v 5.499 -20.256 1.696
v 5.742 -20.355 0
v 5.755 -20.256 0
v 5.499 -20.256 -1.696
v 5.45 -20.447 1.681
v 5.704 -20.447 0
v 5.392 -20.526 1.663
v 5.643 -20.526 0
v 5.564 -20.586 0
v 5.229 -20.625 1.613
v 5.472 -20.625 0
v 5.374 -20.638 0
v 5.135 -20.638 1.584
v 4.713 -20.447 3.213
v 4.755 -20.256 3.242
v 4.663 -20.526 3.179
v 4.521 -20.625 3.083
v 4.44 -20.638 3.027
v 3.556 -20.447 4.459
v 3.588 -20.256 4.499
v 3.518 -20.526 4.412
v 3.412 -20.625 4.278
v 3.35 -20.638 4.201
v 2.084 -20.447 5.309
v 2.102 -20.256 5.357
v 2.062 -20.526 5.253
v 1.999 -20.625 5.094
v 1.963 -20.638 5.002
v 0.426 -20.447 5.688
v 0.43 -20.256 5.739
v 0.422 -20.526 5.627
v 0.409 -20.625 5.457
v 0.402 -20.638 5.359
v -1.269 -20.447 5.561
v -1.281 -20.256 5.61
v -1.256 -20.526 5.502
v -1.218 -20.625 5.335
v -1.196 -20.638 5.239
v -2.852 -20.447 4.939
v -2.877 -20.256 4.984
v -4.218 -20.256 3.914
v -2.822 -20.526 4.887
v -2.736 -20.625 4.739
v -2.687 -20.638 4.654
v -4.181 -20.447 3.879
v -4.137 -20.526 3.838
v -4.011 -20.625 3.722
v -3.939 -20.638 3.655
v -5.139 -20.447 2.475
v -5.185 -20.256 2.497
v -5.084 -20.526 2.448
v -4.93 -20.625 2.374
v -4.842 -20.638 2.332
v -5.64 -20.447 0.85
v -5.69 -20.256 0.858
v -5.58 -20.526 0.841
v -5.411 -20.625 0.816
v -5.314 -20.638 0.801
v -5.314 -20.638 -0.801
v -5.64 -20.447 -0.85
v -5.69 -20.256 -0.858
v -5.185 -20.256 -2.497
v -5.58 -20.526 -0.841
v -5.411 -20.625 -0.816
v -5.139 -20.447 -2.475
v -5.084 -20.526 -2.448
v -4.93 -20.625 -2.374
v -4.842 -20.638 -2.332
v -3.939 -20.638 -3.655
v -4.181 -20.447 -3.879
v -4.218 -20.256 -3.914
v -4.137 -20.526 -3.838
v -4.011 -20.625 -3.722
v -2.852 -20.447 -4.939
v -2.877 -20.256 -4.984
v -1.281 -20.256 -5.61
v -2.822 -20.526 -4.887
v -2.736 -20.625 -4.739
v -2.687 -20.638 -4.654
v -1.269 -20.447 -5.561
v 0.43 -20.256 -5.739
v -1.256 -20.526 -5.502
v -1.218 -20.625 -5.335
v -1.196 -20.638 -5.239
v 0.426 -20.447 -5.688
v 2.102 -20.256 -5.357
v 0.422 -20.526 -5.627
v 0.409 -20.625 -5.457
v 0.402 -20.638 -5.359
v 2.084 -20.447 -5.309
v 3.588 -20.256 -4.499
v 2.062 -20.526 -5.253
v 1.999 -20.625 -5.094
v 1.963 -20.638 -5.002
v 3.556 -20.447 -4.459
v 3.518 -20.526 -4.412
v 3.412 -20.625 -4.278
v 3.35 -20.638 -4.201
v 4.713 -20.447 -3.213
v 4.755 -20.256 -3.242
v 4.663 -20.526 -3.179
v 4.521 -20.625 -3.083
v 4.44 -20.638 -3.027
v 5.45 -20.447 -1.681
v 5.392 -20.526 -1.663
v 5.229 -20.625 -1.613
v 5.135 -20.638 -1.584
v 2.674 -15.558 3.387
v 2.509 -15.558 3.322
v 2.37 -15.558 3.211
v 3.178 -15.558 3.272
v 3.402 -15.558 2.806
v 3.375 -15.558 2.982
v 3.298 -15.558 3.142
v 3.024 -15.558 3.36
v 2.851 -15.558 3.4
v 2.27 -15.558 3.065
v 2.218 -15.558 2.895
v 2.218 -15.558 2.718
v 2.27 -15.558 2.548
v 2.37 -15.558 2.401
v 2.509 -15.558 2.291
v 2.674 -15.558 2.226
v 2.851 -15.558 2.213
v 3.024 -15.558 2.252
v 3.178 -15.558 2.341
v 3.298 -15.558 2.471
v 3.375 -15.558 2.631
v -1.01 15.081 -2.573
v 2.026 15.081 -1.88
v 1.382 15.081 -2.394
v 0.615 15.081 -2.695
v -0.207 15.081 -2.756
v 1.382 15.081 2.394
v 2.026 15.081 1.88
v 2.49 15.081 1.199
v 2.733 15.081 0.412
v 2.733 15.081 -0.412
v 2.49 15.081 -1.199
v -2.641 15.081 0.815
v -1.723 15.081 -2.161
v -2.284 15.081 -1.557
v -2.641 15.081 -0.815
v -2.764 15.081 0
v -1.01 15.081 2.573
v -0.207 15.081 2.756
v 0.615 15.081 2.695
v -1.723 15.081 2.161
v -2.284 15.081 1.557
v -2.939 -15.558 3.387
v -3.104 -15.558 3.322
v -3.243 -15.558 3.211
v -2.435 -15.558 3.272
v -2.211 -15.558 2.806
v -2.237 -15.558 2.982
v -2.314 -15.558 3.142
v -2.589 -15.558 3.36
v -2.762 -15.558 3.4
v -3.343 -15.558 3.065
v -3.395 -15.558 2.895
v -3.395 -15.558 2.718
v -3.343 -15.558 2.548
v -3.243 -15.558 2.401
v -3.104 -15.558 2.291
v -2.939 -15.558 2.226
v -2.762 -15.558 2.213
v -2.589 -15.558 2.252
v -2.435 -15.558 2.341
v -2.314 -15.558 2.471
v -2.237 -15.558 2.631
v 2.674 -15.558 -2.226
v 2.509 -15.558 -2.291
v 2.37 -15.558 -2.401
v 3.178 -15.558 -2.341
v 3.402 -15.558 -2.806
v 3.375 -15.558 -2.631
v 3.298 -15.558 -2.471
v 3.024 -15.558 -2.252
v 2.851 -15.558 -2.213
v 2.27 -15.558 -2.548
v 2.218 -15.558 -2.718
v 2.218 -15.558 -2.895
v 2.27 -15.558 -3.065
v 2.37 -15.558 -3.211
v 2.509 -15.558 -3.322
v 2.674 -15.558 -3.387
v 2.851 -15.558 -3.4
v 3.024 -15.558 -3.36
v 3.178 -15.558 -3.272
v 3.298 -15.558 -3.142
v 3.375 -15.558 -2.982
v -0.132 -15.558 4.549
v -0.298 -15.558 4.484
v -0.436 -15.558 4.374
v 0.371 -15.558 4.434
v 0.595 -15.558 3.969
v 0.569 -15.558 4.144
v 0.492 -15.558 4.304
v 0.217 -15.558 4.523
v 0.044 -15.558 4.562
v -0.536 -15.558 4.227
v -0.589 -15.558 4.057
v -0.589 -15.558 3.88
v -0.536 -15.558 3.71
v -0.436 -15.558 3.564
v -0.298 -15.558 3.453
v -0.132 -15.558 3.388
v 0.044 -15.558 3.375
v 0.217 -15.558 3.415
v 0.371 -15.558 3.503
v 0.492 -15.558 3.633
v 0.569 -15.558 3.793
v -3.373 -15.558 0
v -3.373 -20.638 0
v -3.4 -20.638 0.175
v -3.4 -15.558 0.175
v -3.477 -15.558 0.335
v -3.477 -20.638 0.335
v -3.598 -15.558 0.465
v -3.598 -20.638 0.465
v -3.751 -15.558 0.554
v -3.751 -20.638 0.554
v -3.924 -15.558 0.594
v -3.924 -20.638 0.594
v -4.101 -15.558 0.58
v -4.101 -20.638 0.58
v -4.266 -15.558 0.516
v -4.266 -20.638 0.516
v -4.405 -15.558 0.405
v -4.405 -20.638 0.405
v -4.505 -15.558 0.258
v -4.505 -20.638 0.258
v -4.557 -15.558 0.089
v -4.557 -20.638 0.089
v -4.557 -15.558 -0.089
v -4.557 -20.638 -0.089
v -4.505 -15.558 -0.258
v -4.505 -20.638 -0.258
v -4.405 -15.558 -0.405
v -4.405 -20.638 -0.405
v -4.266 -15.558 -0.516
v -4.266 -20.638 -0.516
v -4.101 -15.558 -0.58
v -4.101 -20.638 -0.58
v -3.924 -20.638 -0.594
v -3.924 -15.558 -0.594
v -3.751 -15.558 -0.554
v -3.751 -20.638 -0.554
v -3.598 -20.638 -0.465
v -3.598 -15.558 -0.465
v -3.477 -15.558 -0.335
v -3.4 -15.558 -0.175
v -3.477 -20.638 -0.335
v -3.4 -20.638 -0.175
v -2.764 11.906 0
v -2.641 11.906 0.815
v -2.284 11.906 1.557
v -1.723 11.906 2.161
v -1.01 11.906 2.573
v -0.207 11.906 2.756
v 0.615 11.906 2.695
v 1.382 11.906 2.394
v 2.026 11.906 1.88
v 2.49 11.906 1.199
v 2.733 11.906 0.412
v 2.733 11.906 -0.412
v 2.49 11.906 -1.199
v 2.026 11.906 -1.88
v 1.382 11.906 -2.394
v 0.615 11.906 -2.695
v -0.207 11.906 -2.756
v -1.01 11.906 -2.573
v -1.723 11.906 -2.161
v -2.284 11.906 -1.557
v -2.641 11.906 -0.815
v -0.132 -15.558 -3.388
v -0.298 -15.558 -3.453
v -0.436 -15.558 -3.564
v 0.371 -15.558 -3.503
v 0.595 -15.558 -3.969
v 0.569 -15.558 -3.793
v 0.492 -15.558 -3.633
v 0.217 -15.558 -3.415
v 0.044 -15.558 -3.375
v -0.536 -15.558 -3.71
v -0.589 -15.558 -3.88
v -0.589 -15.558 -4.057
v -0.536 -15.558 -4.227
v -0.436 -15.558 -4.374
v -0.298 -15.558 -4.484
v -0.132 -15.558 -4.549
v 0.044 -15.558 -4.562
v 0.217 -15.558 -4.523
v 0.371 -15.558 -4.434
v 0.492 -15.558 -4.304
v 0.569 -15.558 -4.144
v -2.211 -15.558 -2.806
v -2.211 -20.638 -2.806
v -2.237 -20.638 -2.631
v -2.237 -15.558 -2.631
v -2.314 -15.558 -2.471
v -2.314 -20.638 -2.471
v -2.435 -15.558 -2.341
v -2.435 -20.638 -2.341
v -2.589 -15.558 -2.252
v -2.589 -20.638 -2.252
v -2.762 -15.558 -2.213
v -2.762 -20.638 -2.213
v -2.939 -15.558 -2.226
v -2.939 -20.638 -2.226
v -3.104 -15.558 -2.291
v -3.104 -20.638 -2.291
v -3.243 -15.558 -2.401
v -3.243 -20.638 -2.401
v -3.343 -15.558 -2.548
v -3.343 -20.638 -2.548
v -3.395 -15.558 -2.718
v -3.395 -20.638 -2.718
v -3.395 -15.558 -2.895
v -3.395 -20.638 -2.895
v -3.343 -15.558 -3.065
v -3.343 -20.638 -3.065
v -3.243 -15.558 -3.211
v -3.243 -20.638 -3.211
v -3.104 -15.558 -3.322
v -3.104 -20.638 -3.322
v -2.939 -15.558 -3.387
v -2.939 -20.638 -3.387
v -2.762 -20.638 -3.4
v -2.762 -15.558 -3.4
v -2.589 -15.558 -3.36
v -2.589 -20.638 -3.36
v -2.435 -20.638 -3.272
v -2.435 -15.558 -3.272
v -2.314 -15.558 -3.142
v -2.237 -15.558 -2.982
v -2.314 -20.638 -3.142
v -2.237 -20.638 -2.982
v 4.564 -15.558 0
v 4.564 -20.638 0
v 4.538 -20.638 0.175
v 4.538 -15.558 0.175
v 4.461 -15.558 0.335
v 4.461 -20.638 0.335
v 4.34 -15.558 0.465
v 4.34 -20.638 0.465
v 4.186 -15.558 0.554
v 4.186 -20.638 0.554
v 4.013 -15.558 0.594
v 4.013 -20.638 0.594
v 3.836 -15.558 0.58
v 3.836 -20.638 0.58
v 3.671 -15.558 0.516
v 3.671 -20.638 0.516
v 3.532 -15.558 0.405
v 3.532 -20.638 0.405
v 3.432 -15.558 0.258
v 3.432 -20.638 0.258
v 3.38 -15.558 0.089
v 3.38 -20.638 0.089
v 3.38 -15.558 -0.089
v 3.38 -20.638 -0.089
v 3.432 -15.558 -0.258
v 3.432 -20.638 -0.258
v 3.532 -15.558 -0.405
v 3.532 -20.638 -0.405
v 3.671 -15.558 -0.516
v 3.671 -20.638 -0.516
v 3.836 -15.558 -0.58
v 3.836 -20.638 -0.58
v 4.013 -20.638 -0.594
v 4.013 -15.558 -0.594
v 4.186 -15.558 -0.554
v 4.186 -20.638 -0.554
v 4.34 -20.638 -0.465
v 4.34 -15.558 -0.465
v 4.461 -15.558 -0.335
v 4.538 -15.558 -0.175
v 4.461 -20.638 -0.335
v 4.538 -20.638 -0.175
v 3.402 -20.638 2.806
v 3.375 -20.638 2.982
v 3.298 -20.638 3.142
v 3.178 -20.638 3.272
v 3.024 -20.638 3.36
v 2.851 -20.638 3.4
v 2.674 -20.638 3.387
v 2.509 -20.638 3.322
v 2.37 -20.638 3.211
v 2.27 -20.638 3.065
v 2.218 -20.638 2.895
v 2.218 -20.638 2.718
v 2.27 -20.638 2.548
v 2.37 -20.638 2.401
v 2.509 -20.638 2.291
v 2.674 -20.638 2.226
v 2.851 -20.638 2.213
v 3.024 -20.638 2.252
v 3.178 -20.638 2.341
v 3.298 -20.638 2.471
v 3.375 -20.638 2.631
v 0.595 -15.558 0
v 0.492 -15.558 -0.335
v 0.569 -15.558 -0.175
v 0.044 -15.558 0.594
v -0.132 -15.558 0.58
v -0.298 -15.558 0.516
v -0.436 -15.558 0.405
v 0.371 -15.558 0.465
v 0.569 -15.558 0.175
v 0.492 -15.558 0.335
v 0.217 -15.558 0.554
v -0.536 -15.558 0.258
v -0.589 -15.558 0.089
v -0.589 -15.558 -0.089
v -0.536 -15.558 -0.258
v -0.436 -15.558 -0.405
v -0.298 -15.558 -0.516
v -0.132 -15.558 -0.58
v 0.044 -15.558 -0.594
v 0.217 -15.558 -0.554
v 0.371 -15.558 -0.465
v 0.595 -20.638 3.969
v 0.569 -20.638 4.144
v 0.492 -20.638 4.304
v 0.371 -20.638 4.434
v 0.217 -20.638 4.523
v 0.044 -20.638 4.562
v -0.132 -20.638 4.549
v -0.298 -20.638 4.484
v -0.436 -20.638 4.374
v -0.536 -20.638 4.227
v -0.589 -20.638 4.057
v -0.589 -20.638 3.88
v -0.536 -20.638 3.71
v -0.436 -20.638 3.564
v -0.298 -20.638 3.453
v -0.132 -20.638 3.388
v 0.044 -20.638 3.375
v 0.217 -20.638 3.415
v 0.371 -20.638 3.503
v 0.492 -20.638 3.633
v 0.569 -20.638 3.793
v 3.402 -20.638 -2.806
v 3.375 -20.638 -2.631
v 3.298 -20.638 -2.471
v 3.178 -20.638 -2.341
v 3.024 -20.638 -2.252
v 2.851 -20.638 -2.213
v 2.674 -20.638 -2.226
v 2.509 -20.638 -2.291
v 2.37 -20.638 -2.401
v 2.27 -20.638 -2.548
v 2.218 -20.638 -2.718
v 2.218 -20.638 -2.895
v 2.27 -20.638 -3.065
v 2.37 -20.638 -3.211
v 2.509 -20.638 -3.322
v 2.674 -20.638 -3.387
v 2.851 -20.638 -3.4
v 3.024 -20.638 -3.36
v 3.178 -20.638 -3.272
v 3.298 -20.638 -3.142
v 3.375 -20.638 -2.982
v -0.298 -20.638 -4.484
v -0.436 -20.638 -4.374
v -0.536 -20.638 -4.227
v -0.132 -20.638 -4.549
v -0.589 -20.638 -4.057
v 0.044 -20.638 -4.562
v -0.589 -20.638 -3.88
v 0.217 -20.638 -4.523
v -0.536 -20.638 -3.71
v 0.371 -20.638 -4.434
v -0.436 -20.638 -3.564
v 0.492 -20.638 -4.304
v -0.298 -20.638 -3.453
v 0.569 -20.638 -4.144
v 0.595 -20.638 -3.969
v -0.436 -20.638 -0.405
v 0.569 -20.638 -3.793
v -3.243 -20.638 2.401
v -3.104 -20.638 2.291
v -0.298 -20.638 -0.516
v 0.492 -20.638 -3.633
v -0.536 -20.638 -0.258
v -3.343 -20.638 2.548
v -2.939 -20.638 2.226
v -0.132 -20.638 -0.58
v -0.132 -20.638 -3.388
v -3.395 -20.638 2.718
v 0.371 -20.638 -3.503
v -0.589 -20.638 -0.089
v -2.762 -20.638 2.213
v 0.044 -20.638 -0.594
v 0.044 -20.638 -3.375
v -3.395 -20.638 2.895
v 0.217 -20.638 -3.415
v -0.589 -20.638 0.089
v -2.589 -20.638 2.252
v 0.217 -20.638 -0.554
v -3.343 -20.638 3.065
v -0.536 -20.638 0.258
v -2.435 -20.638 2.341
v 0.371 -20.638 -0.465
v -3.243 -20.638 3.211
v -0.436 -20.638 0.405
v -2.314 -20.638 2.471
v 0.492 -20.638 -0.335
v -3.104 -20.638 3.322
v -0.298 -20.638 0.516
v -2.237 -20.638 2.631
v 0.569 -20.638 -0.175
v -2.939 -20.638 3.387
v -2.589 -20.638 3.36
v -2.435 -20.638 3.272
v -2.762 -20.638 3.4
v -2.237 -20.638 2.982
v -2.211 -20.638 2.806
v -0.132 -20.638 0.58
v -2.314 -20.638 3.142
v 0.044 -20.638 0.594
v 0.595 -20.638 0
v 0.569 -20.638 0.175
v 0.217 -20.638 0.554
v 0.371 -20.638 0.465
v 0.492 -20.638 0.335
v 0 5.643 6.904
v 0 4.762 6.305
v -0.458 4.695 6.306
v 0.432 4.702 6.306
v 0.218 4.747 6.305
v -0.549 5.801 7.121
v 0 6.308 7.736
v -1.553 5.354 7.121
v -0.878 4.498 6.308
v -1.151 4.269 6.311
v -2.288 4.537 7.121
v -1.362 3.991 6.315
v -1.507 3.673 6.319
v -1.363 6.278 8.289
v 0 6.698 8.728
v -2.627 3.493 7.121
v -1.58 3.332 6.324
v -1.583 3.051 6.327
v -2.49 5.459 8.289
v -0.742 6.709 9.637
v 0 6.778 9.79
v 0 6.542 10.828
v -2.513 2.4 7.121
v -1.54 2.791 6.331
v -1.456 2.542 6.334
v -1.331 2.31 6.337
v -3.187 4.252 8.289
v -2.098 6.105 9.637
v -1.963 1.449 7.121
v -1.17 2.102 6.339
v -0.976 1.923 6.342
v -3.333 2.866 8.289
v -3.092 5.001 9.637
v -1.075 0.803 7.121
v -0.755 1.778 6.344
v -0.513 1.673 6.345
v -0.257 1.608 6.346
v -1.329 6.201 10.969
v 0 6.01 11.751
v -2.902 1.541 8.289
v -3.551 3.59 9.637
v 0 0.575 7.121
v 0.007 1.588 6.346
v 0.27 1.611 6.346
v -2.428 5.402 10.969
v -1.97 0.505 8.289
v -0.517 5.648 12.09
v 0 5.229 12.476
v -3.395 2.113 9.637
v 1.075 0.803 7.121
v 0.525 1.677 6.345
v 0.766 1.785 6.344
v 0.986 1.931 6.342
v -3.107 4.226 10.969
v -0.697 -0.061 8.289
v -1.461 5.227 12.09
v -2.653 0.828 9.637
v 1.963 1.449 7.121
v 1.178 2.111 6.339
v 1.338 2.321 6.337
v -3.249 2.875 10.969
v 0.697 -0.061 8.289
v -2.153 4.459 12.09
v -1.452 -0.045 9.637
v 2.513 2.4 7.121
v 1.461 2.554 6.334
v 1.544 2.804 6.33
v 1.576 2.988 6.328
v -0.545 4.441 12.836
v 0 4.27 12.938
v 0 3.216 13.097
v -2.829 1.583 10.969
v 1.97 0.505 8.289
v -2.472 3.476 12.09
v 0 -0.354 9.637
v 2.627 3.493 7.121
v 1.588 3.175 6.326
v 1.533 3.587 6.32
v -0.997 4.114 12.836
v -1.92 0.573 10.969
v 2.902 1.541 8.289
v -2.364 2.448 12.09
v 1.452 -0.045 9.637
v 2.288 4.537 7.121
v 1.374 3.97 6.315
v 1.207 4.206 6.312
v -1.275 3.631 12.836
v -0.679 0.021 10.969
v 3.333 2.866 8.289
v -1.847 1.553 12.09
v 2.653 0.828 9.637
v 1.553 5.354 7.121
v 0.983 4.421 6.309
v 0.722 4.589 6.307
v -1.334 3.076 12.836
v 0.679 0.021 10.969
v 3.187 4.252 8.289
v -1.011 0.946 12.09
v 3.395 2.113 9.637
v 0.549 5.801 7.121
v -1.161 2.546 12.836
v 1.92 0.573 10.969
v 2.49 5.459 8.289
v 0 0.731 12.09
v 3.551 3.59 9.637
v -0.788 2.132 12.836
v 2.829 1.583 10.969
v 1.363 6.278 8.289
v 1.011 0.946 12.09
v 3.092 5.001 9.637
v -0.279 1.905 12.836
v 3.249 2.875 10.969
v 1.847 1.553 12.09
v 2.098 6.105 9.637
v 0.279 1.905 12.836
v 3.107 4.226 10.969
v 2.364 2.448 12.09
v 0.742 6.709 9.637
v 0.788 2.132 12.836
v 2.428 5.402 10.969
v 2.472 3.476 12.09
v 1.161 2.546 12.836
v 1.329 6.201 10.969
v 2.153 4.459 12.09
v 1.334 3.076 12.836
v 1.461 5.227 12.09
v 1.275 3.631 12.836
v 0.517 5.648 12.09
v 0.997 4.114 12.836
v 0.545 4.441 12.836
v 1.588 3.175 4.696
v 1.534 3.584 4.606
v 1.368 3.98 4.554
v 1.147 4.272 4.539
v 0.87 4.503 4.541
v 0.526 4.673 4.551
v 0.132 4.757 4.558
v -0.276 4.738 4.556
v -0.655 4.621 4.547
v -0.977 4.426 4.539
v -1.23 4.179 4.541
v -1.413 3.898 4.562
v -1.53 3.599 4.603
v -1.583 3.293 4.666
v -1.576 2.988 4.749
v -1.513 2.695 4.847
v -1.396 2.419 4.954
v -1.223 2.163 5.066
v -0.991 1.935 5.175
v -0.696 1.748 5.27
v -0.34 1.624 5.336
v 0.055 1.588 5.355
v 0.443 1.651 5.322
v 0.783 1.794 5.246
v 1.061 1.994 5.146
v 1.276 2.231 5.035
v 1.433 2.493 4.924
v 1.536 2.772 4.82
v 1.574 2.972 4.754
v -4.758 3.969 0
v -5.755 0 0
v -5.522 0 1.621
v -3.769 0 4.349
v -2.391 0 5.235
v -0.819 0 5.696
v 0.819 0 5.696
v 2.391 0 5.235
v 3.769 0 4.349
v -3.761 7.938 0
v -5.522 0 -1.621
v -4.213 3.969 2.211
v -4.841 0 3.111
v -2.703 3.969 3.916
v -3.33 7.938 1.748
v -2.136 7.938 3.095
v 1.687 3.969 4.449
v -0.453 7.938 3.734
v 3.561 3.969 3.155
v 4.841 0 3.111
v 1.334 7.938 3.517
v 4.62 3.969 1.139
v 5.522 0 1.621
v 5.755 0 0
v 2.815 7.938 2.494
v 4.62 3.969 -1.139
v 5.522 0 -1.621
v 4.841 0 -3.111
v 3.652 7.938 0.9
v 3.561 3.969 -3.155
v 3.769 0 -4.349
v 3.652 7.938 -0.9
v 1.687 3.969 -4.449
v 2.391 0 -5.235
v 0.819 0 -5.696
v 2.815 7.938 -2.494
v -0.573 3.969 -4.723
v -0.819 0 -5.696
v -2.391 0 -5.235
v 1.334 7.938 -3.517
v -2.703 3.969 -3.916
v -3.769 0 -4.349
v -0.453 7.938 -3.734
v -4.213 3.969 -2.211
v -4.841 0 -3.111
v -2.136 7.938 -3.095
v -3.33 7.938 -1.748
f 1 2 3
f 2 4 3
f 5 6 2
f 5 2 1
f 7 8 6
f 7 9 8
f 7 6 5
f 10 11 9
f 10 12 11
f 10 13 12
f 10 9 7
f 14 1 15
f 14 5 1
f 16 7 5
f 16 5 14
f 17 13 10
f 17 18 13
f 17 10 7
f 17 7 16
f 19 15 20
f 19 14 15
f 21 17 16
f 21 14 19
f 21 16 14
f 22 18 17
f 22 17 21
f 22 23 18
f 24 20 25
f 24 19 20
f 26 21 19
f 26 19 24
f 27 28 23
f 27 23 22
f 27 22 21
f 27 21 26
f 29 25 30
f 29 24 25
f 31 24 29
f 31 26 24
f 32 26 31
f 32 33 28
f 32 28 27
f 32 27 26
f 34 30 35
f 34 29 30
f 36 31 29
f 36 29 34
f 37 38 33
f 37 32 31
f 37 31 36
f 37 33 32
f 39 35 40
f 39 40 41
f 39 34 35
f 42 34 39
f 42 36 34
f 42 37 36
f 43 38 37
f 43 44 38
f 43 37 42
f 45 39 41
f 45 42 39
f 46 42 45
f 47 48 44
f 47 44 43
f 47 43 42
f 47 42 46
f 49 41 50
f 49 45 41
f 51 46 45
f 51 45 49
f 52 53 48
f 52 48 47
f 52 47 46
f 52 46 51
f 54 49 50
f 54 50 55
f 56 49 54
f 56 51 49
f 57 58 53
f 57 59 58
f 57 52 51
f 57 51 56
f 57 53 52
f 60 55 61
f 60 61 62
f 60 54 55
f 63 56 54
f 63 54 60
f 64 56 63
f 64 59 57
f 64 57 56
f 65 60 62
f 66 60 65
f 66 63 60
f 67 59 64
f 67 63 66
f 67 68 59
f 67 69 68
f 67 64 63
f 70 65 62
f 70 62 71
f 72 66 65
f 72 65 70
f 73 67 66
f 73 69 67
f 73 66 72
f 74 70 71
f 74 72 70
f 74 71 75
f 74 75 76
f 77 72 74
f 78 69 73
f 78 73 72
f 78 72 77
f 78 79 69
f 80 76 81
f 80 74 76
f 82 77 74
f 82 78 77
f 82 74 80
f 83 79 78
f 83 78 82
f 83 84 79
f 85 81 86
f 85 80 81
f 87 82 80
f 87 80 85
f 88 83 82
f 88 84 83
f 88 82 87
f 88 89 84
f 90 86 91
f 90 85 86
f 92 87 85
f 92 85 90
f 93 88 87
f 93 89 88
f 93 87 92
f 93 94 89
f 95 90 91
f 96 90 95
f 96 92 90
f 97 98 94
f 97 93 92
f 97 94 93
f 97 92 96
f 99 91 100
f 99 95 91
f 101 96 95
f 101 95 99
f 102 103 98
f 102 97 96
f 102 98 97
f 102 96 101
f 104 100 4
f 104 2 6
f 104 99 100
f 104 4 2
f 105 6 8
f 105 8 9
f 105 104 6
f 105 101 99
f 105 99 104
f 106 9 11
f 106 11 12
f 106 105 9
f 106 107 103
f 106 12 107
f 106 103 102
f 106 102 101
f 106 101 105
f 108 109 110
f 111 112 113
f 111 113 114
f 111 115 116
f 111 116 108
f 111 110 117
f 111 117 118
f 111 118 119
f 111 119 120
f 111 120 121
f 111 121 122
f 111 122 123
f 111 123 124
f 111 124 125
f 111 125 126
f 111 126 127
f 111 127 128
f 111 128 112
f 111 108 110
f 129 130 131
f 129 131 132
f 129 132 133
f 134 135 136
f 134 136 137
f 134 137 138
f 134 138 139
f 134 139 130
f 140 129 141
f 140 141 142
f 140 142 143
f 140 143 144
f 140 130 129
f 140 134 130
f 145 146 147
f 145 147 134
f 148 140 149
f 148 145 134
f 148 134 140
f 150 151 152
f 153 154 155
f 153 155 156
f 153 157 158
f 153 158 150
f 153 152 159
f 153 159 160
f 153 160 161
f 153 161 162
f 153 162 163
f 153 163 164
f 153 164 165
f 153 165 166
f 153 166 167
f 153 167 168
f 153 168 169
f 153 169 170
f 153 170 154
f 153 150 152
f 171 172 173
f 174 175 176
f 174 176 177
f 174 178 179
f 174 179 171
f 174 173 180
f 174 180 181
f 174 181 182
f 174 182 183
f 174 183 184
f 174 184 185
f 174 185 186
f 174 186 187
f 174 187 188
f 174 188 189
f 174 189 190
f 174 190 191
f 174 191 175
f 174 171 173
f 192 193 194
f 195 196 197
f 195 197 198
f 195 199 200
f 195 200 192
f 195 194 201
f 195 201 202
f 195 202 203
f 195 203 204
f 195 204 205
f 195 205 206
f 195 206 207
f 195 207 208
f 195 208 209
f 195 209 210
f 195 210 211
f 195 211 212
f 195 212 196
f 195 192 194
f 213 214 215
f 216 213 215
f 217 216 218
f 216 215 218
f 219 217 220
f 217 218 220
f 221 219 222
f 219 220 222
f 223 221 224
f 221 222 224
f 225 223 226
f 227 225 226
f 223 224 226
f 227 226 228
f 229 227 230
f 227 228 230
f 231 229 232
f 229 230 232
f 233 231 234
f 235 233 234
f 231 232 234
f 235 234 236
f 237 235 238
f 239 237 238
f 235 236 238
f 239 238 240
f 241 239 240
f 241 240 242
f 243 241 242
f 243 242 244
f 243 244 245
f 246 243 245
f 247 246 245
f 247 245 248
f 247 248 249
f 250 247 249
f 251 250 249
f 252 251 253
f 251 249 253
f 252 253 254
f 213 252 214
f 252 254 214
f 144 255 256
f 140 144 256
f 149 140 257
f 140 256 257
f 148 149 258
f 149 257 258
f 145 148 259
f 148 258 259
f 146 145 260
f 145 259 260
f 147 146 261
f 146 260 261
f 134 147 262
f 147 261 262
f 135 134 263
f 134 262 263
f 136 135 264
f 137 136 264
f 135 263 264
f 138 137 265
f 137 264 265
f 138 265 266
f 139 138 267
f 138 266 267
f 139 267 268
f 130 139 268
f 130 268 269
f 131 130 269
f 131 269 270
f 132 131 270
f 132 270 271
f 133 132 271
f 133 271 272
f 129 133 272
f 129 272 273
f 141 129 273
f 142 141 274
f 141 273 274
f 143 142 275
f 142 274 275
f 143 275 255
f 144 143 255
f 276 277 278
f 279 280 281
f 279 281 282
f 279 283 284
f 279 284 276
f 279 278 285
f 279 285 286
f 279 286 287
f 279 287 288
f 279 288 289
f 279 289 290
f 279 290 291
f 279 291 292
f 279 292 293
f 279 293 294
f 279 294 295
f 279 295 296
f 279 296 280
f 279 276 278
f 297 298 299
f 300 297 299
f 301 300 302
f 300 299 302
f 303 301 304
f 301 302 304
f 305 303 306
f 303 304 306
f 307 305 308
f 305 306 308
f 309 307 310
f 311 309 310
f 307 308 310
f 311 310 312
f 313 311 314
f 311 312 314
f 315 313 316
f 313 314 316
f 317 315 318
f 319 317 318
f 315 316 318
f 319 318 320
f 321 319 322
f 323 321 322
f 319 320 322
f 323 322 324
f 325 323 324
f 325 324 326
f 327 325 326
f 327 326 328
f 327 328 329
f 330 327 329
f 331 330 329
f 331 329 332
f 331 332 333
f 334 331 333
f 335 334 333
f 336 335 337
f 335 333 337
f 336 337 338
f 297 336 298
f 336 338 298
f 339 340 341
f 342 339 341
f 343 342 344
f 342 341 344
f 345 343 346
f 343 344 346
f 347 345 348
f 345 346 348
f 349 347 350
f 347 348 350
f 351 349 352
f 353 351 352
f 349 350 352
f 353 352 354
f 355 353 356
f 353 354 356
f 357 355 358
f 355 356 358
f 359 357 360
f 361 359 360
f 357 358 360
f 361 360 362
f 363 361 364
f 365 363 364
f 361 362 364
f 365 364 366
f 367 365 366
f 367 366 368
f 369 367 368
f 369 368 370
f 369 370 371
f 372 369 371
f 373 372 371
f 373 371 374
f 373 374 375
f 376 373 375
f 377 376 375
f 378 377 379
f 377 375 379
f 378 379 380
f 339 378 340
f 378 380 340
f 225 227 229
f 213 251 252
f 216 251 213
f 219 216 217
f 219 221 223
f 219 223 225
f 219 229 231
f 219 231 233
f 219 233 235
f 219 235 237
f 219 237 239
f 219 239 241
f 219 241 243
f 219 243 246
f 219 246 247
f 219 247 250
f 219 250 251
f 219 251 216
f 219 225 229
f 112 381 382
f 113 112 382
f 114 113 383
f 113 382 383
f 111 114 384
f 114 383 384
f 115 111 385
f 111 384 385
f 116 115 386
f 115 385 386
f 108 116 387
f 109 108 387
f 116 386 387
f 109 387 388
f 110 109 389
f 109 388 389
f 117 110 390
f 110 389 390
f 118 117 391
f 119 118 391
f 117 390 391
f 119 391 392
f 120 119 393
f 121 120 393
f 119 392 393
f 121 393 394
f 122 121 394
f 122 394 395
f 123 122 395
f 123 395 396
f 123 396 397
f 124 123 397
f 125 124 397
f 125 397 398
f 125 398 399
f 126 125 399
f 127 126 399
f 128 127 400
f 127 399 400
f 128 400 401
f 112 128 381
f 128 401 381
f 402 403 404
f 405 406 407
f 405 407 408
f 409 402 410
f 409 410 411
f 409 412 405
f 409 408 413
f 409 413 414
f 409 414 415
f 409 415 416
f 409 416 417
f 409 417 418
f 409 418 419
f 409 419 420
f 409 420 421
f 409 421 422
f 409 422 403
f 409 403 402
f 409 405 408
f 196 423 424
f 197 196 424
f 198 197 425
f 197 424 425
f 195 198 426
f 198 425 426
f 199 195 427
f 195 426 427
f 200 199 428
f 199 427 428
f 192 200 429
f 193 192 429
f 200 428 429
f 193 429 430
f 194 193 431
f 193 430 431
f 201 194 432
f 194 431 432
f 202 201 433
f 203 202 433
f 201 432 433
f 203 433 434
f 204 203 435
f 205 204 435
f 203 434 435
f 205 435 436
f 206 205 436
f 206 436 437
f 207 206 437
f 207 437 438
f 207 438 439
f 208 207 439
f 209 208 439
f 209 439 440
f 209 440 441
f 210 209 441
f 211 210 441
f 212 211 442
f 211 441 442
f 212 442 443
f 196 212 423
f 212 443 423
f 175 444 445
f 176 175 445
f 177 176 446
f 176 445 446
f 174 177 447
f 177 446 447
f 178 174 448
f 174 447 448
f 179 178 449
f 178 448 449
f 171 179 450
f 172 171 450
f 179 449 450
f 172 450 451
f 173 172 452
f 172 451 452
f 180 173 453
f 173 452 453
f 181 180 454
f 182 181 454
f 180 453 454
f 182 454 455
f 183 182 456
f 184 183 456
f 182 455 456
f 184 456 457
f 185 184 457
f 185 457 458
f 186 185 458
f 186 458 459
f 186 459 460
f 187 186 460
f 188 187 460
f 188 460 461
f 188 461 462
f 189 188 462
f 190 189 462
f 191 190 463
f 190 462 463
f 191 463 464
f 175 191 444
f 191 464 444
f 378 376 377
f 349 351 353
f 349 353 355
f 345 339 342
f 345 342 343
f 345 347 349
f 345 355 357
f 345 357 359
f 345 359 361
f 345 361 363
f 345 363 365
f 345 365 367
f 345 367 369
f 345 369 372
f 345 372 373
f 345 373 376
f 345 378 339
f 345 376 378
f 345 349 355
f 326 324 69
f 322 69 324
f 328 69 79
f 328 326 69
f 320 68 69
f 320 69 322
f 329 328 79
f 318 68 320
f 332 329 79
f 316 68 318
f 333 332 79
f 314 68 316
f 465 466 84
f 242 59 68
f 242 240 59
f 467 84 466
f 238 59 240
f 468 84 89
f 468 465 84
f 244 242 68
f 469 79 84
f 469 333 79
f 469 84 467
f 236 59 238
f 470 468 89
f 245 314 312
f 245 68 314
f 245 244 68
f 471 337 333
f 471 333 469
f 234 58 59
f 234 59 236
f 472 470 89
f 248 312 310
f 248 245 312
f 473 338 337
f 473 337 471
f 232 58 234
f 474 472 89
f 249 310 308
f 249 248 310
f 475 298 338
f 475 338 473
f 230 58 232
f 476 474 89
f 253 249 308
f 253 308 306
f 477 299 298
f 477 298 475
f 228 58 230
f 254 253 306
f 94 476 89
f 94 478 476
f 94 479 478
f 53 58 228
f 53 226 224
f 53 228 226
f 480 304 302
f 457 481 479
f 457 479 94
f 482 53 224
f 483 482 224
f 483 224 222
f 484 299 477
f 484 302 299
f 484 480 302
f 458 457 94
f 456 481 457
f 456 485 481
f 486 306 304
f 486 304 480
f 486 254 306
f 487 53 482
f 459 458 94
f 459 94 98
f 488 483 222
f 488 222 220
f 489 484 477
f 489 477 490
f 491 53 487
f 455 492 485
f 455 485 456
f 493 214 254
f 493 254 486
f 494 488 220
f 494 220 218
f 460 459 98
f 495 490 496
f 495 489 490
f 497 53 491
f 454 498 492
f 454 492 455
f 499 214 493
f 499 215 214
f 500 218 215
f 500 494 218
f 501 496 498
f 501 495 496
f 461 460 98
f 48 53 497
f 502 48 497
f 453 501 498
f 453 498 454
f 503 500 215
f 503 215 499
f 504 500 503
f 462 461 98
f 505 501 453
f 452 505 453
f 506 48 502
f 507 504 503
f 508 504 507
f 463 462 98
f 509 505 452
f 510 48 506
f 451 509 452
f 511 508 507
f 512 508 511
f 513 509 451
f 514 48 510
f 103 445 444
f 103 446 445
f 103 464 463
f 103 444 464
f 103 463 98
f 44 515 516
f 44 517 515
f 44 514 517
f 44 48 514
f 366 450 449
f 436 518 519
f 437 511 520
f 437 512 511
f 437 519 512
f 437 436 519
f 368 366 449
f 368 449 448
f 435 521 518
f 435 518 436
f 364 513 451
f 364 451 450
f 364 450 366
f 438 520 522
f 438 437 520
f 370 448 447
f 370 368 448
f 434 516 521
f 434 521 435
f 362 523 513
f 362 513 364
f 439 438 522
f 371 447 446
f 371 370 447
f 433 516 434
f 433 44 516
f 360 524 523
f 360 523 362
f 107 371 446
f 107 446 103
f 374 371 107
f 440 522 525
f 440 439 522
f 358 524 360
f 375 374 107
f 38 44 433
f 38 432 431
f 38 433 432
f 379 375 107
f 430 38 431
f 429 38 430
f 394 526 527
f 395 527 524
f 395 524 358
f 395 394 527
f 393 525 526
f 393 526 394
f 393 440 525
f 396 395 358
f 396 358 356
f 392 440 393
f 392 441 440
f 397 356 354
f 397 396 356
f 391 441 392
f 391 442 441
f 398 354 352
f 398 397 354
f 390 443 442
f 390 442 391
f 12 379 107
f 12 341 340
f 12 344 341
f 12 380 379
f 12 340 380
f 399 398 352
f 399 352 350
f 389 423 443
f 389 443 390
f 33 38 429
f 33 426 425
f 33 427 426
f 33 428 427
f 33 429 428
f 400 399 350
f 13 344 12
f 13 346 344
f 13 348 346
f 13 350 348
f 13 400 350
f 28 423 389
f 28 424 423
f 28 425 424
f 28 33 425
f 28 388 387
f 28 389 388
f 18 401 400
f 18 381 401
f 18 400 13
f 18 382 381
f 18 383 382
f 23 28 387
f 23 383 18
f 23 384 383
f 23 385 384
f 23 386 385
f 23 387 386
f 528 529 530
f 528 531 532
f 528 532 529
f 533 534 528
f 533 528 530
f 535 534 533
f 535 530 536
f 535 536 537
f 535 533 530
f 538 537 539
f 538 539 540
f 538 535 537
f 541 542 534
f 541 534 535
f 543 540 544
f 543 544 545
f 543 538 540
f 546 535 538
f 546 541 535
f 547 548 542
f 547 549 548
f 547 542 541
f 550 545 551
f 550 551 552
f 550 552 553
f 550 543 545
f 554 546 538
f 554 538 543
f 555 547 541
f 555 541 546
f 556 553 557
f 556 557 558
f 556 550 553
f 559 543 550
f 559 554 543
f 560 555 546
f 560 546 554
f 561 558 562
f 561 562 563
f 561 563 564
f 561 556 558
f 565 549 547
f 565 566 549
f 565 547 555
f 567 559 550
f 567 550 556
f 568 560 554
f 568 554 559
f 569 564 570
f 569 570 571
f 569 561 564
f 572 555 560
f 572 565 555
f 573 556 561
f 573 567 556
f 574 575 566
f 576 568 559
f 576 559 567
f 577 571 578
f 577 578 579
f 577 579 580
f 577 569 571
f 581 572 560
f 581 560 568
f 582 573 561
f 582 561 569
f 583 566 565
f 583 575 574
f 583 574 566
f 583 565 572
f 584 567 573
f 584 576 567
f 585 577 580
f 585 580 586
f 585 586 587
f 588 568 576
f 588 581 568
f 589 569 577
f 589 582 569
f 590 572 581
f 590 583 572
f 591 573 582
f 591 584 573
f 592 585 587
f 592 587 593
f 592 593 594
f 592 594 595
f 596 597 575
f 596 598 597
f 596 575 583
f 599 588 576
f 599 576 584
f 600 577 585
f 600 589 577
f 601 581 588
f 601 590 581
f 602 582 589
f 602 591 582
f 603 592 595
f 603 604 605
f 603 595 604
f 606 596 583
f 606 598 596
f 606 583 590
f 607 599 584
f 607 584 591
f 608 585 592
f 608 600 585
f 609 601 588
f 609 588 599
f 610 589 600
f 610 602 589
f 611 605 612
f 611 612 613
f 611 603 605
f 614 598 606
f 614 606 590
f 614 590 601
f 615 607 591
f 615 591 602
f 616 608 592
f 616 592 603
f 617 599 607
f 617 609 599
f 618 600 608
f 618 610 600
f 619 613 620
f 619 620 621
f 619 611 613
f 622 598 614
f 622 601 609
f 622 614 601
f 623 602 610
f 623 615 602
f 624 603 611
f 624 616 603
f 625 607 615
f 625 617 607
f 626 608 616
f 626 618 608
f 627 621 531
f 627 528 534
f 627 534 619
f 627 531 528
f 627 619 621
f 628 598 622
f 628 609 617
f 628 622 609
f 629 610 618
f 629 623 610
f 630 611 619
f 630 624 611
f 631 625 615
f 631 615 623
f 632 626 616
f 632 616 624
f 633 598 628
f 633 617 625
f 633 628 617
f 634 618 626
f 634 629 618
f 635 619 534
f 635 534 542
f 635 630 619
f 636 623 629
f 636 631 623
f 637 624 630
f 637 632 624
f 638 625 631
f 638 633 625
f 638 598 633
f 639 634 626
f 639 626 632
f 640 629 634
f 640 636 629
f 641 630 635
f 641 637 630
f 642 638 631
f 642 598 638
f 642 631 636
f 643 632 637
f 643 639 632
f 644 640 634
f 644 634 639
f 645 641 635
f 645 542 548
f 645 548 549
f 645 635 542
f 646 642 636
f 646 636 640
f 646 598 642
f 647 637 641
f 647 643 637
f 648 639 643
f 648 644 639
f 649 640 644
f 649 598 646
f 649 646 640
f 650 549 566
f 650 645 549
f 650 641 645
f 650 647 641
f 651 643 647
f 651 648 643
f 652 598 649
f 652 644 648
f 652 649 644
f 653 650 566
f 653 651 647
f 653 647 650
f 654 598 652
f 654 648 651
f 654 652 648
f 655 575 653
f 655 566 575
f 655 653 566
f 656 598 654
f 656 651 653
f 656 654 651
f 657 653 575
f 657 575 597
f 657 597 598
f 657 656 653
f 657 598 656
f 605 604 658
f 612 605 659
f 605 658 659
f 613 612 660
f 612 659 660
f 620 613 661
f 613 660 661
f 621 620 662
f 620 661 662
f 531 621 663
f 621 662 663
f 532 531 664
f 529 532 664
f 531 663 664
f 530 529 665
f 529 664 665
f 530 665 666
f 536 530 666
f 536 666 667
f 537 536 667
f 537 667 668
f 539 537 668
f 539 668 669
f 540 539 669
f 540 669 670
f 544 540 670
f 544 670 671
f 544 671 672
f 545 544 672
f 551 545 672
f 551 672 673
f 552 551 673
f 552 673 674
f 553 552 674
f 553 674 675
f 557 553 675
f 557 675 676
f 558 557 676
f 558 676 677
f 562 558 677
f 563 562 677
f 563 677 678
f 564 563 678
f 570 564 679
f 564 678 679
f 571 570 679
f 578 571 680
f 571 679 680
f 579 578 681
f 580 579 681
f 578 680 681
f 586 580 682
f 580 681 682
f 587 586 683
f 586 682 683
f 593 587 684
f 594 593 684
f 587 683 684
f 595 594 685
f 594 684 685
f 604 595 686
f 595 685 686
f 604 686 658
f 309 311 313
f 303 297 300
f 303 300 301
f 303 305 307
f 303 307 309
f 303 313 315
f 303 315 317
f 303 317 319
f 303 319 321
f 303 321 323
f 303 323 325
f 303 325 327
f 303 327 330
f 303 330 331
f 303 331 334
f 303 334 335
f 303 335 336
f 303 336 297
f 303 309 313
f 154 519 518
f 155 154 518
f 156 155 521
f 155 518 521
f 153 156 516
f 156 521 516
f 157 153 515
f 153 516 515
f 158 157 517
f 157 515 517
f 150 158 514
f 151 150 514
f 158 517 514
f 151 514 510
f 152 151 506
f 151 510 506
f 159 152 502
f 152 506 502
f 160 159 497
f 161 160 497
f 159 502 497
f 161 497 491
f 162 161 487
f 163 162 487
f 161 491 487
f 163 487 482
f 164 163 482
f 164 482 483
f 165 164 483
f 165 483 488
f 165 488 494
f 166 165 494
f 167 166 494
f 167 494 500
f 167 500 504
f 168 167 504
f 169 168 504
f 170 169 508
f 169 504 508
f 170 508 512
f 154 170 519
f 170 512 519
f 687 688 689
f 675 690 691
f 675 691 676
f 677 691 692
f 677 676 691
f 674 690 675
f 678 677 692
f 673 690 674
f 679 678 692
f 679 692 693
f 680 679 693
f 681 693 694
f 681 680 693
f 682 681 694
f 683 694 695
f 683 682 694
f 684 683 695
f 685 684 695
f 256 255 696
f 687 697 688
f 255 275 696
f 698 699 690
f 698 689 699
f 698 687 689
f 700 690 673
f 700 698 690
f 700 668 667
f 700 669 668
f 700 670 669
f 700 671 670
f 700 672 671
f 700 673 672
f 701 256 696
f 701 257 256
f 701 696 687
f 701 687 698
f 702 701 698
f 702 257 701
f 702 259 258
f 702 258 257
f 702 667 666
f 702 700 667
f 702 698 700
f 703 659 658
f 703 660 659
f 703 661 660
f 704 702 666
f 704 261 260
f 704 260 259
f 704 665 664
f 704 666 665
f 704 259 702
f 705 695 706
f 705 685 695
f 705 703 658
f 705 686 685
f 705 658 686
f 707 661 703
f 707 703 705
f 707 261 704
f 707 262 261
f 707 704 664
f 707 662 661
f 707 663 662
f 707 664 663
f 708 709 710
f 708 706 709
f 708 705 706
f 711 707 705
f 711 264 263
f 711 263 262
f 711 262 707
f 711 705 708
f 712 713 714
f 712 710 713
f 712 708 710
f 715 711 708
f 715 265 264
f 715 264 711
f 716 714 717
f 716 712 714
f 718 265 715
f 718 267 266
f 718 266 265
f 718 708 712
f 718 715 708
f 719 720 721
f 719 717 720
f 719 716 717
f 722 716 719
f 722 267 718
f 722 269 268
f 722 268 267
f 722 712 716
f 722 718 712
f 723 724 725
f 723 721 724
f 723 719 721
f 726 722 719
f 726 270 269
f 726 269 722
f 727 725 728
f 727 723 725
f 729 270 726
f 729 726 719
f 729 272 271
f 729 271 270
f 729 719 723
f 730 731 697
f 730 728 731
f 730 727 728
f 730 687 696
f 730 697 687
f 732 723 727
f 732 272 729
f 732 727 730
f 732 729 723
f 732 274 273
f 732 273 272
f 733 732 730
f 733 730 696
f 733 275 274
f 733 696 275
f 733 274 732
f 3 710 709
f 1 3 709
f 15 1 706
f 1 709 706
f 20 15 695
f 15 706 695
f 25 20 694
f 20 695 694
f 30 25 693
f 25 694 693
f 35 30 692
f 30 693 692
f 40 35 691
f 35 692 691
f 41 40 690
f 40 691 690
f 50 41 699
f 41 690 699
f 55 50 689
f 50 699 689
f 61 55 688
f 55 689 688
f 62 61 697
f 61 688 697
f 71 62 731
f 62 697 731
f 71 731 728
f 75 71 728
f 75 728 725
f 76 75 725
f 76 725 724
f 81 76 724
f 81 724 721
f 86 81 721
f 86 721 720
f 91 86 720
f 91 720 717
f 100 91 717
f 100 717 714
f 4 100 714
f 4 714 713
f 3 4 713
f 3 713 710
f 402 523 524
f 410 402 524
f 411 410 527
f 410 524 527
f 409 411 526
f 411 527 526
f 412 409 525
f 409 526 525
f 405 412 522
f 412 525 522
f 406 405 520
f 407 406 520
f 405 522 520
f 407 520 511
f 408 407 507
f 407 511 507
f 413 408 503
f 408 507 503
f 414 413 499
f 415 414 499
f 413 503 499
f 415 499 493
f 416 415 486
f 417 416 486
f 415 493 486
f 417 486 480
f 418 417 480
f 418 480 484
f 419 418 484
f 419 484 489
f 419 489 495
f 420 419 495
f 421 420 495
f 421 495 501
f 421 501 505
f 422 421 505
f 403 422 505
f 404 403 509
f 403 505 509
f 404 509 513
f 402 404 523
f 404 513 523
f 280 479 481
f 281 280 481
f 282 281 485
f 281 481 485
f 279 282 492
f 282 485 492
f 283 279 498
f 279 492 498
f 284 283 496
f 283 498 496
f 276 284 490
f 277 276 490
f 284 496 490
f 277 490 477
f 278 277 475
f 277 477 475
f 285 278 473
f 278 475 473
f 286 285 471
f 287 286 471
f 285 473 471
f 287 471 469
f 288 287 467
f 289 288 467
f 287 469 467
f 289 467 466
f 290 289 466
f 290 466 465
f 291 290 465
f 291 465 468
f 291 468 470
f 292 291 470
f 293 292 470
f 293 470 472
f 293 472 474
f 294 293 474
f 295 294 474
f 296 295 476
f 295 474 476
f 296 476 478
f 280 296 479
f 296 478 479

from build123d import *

# Parameters (mm, degrees)
F0_R      = 5.7546875
F1_DEPTH  = 20.6375
F2_R      = 5.7546875
F3_DEPTH  = 11.90625
F3_TAPER  = 14.1
F4_R      = 2.7640442106
F5_DEPTH  = 3.175
F6_R      = 0.5953125
F7_DEPTH  = 5.08
F8_R      = 0.381
F9_R      = 1.5875
F10_DEPTH = 9.525


with BuildPart() as f1:
    # F0 (on Front) → F1 (new body)
    with BuildSketch(Plane.XZ):
        Circle(F0_R)
    extrude(amount=F1_DEPTH)

    # F2 (on face) → F3 (join)
    with BuildSketch(Plane(origin=(0, 0, 0), x_dir=(-1, 0, 0), z_dir=(0, 1, 0))):
        Circle(F2_R)
    extrude(amount=F3_DEPTH, taper=F3_TAPER)

    # F4 (on face) → F5 (join)
    with BuildSketch(Plane(origin=(0, 11.90625, 0), x_dir=(-1, 0, 0), z_dir=(0, 1, 0))):
        Circle(F4_R)
    extrude(amount=F5_DEPTH)

    # F6 (on face) → F7 (cut)
    with BuildSketch(Plane.XZ.offset(20.6375)):
        Circle(F6_R)
        with Locations((0, 3.96875)):
            Circle(F6_R)
        with Locations((-2.8063300378, 2.8063300378)):
            Circle(F6_R)
        with Locations((-3.96875, 0)):
            Circle(F6_R)
        with Locations((-2.8063300378, -2.8063300378)):
            Circle(F6_R)
        with Locations((0, -3.96875)):
            Circle(F6_R)
        with Locations((2.8063300378, -2.8063300378)):
            Circle(F6_R)
        with Locations((3.96875, 0)):
            Circle(F6_R)
        with Locations((2.8063300378, 2.8063300378)):
            Circle(F6_R)
    extrude(amount=-F7_DEPTH, mode=Mode.SUBTRACT)

    # F8
    f8_edges = [f1.edges().sort_by_distance(p)[0] for p in [
        (-5.754687, -20.6375, 0),
    ]]
    fillet(f8_edges, radius=F8_R)

    # F9 (on Top) → F10 (join)
    with BuildSketch(Plane.XY):
        with Locations((0, 3.175)):
            Circle(F9_R)
    extrude(amount=F10_DEPTH)

    # F11 (on Right) → F12 (revolve)
    with BuildSketch(Plane.YZ):
        with BuildLine():
            Line((3.2164233271, 13.096875), (3.2164233271, 5.953125))
            ThreePointArc((3.2164233271, 5.953125), (6.7882983271, 9.525), (3.2164233271, 13.096875))
        make_face()
    revolve(axis=Axis((0, 3.2164233271, 9.525), (0, 0, 1)))


solid = f1.part
